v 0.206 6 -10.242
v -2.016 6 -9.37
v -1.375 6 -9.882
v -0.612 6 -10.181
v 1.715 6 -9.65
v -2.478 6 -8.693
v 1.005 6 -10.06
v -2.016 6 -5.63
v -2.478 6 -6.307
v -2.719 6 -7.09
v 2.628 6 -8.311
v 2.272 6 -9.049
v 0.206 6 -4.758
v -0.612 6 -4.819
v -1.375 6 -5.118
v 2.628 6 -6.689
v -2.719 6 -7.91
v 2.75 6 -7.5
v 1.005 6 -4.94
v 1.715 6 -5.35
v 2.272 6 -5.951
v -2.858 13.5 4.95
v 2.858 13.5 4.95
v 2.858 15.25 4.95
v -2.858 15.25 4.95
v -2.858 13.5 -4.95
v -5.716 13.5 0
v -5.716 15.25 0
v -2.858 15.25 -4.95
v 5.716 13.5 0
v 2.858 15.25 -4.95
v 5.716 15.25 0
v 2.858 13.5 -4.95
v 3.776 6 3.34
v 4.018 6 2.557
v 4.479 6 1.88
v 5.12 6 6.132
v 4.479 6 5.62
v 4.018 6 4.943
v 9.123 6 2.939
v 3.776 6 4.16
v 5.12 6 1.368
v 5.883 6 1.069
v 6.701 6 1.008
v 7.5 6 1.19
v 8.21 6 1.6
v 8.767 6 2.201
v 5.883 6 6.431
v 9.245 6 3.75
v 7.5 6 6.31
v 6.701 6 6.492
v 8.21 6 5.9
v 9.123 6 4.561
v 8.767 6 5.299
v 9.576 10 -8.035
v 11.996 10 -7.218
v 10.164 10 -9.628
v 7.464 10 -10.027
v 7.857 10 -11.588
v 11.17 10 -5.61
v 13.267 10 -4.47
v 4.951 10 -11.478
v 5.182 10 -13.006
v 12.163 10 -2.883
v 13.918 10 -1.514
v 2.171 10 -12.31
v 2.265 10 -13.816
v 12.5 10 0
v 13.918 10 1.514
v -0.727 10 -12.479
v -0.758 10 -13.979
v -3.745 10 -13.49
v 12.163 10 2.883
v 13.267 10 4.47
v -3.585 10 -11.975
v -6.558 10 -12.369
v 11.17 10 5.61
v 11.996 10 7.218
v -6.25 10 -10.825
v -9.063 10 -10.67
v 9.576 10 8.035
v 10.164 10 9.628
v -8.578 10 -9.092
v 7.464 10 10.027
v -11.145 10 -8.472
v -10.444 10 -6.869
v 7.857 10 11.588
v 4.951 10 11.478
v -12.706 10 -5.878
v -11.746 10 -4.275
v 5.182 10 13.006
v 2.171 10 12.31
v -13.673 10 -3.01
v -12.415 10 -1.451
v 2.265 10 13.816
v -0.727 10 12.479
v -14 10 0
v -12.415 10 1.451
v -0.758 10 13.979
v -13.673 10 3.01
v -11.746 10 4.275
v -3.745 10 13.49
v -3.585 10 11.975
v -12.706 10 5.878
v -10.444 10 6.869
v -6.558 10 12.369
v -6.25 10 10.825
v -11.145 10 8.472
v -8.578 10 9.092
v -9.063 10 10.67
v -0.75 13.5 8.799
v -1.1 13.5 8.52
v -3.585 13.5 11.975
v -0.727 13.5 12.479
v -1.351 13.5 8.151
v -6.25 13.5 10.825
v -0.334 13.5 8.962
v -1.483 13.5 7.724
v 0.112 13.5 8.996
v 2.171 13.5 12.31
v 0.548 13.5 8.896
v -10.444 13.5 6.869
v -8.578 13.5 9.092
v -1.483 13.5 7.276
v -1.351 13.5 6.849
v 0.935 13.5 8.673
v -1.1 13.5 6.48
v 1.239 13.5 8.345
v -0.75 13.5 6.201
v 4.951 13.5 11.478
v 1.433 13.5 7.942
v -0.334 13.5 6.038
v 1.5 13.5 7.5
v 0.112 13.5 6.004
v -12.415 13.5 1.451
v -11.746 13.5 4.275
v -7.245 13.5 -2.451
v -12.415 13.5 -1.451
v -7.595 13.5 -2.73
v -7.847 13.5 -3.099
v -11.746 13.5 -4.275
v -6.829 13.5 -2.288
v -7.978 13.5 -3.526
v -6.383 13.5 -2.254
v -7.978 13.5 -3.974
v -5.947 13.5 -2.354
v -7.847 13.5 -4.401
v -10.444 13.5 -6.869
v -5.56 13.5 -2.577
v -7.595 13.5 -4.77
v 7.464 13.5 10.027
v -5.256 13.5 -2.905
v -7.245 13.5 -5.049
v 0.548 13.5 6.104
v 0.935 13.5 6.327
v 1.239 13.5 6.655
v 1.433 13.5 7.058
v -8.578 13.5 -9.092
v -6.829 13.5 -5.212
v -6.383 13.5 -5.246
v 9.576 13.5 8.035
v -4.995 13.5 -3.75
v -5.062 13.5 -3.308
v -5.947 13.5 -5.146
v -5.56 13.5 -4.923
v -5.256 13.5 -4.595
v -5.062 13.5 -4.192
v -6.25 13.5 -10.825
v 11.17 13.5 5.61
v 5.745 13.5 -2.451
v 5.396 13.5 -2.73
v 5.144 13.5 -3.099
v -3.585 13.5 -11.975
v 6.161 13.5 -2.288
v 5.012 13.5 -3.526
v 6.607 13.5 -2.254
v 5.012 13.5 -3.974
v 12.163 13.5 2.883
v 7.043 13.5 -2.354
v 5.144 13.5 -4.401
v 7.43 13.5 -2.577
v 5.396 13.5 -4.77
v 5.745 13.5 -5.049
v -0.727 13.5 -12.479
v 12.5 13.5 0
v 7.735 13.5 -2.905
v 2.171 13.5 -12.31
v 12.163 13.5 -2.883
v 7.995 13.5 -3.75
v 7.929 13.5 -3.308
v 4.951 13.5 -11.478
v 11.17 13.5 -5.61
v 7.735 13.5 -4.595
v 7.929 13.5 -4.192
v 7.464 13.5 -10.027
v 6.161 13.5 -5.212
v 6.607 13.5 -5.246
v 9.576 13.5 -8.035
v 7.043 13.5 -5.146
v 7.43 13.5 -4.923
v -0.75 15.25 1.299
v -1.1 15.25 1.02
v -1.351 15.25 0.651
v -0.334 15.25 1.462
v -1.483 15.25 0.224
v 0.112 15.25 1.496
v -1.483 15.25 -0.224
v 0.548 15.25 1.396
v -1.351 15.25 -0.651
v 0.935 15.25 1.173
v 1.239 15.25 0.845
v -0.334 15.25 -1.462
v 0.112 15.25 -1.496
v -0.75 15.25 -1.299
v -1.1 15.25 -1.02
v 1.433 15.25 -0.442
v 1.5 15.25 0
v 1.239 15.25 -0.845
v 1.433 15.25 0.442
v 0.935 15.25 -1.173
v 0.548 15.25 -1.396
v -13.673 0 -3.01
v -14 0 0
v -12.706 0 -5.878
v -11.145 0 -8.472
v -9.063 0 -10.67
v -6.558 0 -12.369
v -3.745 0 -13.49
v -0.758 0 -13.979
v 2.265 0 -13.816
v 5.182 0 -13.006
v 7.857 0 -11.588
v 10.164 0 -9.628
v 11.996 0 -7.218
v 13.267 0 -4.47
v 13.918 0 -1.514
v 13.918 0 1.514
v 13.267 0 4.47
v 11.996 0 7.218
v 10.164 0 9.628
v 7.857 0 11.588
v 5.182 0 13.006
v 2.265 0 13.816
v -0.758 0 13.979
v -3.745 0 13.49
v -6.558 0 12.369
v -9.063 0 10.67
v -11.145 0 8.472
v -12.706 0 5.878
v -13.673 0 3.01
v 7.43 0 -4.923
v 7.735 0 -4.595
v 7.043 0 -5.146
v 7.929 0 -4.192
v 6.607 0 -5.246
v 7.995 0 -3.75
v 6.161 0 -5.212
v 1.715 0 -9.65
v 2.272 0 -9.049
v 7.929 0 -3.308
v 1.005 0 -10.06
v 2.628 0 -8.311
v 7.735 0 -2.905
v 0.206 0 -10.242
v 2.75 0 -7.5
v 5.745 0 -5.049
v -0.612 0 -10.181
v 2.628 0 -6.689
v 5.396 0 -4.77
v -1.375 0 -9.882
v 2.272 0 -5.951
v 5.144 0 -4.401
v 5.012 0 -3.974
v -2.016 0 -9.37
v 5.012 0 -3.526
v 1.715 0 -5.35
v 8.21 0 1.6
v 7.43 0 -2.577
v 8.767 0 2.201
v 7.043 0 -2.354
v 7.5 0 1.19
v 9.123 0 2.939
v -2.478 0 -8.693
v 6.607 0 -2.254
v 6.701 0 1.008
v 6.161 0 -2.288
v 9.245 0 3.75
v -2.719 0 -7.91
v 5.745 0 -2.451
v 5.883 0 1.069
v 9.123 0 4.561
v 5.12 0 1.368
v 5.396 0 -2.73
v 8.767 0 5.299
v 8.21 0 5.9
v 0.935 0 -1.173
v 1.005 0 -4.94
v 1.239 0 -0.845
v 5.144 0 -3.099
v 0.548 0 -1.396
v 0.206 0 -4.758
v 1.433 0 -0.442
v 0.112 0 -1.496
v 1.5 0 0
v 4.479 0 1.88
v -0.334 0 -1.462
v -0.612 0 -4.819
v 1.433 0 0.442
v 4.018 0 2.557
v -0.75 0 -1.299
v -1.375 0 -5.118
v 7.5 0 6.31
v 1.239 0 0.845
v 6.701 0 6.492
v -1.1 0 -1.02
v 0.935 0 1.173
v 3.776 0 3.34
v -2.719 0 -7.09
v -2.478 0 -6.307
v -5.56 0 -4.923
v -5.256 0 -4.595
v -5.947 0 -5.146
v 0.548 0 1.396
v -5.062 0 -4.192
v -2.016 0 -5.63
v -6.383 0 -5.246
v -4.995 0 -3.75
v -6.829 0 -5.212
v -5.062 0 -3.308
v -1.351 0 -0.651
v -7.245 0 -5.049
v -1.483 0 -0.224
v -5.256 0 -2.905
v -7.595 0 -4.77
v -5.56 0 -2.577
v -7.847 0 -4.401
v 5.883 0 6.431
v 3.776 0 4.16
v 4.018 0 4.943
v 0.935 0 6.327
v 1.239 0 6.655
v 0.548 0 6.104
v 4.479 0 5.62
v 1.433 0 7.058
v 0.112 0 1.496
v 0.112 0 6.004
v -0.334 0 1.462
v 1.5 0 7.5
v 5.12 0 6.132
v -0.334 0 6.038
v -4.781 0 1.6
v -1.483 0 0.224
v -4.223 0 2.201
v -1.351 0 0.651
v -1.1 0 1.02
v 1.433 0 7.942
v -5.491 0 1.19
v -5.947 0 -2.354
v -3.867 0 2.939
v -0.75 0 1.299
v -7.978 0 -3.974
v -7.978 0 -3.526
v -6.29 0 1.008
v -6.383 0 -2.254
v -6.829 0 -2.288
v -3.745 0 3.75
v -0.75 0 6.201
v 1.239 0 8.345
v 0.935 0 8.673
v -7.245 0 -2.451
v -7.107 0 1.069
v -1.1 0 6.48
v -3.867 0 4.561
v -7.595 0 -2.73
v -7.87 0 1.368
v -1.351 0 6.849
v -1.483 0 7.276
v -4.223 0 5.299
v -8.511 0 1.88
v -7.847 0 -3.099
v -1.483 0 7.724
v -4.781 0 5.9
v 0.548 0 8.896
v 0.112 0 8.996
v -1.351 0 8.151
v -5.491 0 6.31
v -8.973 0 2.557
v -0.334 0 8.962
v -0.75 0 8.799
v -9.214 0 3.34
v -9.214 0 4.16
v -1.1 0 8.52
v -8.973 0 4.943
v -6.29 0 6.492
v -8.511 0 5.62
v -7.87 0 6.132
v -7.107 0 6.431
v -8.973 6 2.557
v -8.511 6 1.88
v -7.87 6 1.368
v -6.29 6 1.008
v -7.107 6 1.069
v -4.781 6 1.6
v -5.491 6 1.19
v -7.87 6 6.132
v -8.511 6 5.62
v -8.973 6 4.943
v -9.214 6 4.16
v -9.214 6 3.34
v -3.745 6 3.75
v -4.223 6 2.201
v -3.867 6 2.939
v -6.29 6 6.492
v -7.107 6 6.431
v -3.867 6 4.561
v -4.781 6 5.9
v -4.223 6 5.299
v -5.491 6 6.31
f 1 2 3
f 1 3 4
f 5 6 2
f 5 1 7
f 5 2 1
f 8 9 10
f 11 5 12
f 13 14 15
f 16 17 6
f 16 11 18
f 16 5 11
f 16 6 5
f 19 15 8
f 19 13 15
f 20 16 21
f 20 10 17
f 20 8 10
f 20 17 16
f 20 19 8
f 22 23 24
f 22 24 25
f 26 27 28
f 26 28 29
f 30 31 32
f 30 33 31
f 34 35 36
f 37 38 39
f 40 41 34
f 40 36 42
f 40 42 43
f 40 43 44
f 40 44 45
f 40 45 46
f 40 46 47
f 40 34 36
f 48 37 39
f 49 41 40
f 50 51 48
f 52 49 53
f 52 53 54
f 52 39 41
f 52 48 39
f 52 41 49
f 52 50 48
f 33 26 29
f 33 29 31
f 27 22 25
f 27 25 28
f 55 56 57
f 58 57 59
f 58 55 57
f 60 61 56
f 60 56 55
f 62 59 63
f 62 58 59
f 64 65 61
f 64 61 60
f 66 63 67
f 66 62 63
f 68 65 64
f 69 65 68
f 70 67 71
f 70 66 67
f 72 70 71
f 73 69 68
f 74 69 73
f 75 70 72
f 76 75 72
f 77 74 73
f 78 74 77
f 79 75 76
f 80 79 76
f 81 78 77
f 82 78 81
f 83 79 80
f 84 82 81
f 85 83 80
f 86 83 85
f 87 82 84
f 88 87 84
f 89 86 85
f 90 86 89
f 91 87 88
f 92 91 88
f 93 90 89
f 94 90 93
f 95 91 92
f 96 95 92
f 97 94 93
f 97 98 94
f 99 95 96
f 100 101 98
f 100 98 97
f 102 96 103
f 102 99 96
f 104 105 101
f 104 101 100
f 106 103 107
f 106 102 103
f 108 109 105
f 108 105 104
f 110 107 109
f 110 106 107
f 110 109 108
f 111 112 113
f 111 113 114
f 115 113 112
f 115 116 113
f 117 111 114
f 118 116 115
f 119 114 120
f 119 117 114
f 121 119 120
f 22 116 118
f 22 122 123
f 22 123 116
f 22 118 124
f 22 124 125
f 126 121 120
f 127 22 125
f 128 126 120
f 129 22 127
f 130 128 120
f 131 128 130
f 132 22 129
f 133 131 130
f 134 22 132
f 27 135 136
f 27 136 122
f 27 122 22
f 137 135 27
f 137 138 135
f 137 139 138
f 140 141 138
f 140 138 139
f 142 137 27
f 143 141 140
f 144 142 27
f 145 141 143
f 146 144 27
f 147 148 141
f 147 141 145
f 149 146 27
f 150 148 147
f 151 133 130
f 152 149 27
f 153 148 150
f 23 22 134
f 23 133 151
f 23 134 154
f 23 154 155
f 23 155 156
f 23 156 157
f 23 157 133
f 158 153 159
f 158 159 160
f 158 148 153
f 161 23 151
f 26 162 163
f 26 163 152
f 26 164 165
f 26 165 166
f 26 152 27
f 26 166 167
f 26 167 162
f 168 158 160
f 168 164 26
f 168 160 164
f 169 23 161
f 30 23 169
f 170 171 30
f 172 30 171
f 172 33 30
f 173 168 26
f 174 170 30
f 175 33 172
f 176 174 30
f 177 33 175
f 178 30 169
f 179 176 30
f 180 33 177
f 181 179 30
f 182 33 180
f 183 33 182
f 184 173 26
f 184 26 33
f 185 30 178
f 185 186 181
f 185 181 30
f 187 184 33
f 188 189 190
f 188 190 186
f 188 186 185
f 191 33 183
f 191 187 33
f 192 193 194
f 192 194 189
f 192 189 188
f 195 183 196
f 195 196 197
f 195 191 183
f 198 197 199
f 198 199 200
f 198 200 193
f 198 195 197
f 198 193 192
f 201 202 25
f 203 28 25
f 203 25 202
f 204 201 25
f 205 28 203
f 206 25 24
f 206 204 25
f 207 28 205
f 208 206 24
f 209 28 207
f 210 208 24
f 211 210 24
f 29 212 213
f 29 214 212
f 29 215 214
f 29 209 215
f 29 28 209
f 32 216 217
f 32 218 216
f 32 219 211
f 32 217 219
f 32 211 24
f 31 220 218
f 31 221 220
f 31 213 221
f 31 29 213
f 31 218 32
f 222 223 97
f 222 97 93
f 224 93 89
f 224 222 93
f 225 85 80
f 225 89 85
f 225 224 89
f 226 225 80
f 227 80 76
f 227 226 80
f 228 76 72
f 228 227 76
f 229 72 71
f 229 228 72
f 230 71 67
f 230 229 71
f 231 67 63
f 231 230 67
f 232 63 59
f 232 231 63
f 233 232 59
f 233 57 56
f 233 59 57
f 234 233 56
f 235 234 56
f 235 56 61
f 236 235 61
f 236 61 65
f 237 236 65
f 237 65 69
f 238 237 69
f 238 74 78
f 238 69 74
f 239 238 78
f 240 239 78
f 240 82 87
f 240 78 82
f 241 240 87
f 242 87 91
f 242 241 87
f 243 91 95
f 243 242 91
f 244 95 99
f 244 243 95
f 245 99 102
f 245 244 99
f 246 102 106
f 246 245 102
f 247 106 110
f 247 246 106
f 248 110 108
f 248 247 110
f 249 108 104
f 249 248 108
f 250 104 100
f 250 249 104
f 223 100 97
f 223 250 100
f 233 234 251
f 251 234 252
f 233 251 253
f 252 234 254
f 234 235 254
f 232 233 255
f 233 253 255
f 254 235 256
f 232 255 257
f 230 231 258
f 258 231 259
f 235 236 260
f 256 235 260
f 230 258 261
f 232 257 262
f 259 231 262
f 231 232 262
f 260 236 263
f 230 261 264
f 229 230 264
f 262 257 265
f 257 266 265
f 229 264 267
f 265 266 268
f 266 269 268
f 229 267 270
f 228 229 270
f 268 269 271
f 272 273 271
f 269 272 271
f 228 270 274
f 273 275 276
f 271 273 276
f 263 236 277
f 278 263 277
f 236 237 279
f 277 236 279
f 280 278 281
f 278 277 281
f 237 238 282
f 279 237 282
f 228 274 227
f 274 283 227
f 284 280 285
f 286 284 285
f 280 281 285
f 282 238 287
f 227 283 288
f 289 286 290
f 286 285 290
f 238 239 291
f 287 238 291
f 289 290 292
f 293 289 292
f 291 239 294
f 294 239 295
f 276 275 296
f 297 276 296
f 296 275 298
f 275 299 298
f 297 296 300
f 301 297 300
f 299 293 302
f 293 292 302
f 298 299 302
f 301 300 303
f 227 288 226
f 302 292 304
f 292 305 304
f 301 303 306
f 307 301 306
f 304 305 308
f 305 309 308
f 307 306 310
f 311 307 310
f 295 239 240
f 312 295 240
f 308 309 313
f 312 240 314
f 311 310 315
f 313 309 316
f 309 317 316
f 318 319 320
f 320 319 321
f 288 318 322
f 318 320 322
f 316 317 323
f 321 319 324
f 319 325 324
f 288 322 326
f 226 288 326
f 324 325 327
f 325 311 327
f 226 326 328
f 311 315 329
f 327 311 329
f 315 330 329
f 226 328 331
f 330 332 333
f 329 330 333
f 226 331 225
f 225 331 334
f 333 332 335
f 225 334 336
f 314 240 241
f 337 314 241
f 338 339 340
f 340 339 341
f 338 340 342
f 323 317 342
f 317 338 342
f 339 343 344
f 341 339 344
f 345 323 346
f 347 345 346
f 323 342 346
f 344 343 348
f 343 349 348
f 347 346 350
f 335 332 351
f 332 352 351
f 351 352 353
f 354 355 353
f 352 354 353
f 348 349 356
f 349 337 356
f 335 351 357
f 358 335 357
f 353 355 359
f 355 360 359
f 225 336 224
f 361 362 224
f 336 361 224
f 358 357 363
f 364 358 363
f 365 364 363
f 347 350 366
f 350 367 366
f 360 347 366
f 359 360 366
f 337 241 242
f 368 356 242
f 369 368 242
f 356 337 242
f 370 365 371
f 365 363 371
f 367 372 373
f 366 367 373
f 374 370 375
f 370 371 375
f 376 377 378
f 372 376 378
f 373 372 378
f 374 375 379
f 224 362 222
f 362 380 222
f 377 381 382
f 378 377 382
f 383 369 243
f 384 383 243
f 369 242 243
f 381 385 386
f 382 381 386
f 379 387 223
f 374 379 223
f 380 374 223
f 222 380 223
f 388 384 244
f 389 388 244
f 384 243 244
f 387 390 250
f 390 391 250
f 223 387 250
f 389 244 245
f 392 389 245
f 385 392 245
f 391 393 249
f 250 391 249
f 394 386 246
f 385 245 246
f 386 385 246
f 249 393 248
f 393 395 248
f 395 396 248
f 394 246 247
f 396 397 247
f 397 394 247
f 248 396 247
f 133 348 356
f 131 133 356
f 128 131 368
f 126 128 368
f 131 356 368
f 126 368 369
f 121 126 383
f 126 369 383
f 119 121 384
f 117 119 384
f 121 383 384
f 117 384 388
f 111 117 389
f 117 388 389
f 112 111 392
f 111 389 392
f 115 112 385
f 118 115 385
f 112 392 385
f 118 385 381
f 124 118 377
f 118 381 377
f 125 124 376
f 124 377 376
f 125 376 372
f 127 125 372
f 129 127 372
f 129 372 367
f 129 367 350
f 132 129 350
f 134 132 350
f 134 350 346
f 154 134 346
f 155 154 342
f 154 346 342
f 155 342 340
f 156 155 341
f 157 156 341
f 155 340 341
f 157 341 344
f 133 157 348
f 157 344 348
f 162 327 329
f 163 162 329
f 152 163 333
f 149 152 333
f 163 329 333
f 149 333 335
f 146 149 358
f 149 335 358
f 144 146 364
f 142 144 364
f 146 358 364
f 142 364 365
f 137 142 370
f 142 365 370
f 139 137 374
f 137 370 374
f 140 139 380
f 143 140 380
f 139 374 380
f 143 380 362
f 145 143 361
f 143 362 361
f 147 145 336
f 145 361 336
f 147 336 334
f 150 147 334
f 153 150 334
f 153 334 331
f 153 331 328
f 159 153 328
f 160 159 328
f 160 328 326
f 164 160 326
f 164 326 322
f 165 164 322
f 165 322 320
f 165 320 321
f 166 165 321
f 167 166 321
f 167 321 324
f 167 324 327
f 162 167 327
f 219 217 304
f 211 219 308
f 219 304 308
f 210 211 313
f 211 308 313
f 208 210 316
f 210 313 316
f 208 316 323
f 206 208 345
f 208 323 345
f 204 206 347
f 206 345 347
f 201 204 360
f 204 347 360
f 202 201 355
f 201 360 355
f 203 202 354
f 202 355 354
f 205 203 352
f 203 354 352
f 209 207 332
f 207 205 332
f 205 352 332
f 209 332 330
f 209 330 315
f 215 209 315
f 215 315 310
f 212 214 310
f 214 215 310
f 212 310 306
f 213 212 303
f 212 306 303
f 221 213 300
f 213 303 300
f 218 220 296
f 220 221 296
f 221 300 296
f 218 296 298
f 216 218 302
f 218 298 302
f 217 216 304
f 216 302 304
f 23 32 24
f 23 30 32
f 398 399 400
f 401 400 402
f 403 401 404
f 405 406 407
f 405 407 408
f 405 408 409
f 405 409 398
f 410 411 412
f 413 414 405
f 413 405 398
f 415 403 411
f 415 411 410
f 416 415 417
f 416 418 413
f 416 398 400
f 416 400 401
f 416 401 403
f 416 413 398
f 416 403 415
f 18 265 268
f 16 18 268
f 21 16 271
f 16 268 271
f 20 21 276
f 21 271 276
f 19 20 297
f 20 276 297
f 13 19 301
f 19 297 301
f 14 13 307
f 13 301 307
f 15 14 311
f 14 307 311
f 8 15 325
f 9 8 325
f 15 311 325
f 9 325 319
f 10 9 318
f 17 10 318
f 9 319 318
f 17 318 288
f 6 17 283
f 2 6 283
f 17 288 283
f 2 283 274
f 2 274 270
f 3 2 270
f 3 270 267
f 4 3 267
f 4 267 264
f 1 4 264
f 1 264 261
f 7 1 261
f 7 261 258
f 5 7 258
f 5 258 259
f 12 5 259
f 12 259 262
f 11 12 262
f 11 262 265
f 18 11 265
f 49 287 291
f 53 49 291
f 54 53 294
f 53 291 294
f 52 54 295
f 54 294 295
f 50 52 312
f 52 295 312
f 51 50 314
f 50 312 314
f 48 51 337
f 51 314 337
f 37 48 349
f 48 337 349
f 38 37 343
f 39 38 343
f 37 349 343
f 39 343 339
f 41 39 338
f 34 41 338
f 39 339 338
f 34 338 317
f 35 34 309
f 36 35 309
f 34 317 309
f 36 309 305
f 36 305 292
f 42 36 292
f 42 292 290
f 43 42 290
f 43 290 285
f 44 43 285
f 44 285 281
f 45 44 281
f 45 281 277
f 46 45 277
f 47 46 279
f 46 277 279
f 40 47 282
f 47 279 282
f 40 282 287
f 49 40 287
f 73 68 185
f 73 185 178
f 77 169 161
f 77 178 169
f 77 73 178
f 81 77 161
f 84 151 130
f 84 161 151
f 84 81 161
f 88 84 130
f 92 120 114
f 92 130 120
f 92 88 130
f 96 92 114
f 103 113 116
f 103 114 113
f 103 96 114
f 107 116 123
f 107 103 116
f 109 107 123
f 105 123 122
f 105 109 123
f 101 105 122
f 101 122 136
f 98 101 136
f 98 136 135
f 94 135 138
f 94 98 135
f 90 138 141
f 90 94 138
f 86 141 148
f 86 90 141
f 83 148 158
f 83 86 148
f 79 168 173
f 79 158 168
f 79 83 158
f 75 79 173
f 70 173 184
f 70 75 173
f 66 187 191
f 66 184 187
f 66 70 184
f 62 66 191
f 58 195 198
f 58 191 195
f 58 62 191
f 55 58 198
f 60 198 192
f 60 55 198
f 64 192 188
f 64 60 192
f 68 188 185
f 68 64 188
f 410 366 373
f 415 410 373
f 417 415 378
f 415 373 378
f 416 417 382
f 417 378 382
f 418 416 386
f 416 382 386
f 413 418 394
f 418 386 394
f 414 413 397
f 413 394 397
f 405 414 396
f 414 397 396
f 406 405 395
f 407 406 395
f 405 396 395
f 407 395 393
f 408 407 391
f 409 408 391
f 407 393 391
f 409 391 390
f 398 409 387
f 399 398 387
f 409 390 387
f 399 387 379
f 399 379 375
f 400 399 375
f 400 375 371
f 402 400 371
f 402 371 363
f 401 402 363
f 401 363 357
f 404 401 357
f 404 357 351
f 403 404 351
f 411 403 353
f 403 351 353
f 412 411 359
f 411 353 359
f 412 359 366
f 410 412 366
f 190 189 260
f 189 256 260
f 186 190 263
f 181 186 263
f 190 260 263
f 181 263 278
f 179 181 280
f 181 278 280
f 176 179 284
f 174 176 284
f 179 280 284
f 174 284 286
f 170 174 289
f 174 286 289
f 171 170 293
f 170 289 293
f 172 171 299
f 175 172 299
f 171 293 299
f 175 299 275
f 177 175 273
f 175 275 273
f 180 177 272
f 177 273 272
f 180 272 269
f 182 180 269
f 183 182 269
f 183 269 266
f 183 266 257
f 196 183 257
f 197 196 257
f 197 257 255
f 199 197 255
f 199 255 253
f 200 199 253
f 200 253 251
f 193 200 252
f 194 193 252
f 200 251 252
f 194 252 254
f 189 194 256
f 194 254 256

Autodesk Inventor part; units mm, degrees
ref_plane "YZ Plane" through (0, 0, 0) normal (1, 0, 0) x (0, 1, 0)
ref_plane "XZ Plane" through (0, 0, 0) normal (0, 1, 0) x (-1, 0, 0)
ref_plane "XY Plane" through (0, 0, 0) normal (0, 0, 1) x (1, 0, 0)
sketch "Sketch1" plane through (0, 0, 0) normal (0, 1, 0) x (-1, 0, 0)
  circle A0 centre (0, 0) radius 14
  dimension "d0" = 28
extrude "Extrusion1" add sketch "Sketch1" along normal blind 10
sketch "Sketch2" plane through (0, 10, 0) normal (0, 1, 0) x (1, 0, 0)
  circle A0 centre (0, 0) radius 12.5
  dimension "d3" = 25
extrude "Extrusion2" add sketch "Sketch2" along normal blind 3.5
sketch "Sketch3" plane through (0, 0, 0) normal (0, -1, 0) x (1, 0, 0)
  circle A0 centre (0, 0) radius 7.5 construction
  circle A1 centre (0, 0) radius 1.5
  circle A2 centre (0, 7.5) radius 1.5
  circle A3 centre (-6.4952, 3.75) radius 1.5
  circle A4 centre (-6.4952, -3.75) radius 1.5
  circle A5 centre (0, -7.5) radius 1.5
  circle A6 centre (6.4952, -3.75) radius 1.5
  circle A7 centre (6.4952, 3.75) radius 1.5
  dimension "d6" = 15
  dimension "d7" = 3
  dimension "d8" = 3
  dimension "d11" = 360
extrude "Extrusion3" cut sketch "Sketch3" against normal through all contours A1 | A2 | A4 | A6
sketch "Sketch4" plane through (0, 0, 0) normal (0, -1, 0) x (1, 0, 0)
  circle A0 centre (0, 0) radius 7.5
  circle A1 centre (0, -7.5) radius 2.75
  circle A2 centre (0, 0) radius 7.5
  circle A3 centre (6.4952, -3.75) radius 2.75
  circle A4 centre (0, 0) radius 7.5
  circle A5 centre (6.4952, 3.75) radius 2.75
  circle A6 centre (0, 0) radius 7.5
  circle A7 centre (0, 7.5) radius 2.75
  circle A8 centre (0, 0) radius 7.5
  circle A9 centre (-6.4952, 3.75) radius 2.75
  circle A10 centre (0, 0) radius 7.5
  circle A11 centre (-6.4952, -3.75) radius 2.75
  dimension "d15" = 15
  dimension "d16" = 5.5
  dimension "d19" = 360
extrude "Extrusion4" cut sketch "Sketch4" against normal blind 6 contours A5 A0 | A0 A5 | A1 A0 | A0 A1 | A9 A0 | A0 A9
sketch "Sketch5" plane through (0, 13.5, 0) normal (0, 1, 0) x (1, 0, 0)
  line L0 (-2.8579, -4.95) -> (-5.7158, 0)
  line L1 (-5.7158, 0) -> (-2.8579, 4.95)
  line L2 (-2.8579, 4.95) -> (2.8579, 4.95)
  line L3 (2.8579, 4.95) -> (5.7158, 0)
  line L4 (5.7158, 0) -> (2.8579, -4.95)
  line L5 (2.8579, -4.95) -> (-2.8579, -4.95)
  circle A0 centre (0, 0) radius 1.5
  dimension "d23" = 9.9
  dimension "d29" = 3
extrude "Extrusion5" add sketch "Sketch5" along normal blind 1.75
properties part number "Shaft1_Joint1" material "ABS Plastic"
